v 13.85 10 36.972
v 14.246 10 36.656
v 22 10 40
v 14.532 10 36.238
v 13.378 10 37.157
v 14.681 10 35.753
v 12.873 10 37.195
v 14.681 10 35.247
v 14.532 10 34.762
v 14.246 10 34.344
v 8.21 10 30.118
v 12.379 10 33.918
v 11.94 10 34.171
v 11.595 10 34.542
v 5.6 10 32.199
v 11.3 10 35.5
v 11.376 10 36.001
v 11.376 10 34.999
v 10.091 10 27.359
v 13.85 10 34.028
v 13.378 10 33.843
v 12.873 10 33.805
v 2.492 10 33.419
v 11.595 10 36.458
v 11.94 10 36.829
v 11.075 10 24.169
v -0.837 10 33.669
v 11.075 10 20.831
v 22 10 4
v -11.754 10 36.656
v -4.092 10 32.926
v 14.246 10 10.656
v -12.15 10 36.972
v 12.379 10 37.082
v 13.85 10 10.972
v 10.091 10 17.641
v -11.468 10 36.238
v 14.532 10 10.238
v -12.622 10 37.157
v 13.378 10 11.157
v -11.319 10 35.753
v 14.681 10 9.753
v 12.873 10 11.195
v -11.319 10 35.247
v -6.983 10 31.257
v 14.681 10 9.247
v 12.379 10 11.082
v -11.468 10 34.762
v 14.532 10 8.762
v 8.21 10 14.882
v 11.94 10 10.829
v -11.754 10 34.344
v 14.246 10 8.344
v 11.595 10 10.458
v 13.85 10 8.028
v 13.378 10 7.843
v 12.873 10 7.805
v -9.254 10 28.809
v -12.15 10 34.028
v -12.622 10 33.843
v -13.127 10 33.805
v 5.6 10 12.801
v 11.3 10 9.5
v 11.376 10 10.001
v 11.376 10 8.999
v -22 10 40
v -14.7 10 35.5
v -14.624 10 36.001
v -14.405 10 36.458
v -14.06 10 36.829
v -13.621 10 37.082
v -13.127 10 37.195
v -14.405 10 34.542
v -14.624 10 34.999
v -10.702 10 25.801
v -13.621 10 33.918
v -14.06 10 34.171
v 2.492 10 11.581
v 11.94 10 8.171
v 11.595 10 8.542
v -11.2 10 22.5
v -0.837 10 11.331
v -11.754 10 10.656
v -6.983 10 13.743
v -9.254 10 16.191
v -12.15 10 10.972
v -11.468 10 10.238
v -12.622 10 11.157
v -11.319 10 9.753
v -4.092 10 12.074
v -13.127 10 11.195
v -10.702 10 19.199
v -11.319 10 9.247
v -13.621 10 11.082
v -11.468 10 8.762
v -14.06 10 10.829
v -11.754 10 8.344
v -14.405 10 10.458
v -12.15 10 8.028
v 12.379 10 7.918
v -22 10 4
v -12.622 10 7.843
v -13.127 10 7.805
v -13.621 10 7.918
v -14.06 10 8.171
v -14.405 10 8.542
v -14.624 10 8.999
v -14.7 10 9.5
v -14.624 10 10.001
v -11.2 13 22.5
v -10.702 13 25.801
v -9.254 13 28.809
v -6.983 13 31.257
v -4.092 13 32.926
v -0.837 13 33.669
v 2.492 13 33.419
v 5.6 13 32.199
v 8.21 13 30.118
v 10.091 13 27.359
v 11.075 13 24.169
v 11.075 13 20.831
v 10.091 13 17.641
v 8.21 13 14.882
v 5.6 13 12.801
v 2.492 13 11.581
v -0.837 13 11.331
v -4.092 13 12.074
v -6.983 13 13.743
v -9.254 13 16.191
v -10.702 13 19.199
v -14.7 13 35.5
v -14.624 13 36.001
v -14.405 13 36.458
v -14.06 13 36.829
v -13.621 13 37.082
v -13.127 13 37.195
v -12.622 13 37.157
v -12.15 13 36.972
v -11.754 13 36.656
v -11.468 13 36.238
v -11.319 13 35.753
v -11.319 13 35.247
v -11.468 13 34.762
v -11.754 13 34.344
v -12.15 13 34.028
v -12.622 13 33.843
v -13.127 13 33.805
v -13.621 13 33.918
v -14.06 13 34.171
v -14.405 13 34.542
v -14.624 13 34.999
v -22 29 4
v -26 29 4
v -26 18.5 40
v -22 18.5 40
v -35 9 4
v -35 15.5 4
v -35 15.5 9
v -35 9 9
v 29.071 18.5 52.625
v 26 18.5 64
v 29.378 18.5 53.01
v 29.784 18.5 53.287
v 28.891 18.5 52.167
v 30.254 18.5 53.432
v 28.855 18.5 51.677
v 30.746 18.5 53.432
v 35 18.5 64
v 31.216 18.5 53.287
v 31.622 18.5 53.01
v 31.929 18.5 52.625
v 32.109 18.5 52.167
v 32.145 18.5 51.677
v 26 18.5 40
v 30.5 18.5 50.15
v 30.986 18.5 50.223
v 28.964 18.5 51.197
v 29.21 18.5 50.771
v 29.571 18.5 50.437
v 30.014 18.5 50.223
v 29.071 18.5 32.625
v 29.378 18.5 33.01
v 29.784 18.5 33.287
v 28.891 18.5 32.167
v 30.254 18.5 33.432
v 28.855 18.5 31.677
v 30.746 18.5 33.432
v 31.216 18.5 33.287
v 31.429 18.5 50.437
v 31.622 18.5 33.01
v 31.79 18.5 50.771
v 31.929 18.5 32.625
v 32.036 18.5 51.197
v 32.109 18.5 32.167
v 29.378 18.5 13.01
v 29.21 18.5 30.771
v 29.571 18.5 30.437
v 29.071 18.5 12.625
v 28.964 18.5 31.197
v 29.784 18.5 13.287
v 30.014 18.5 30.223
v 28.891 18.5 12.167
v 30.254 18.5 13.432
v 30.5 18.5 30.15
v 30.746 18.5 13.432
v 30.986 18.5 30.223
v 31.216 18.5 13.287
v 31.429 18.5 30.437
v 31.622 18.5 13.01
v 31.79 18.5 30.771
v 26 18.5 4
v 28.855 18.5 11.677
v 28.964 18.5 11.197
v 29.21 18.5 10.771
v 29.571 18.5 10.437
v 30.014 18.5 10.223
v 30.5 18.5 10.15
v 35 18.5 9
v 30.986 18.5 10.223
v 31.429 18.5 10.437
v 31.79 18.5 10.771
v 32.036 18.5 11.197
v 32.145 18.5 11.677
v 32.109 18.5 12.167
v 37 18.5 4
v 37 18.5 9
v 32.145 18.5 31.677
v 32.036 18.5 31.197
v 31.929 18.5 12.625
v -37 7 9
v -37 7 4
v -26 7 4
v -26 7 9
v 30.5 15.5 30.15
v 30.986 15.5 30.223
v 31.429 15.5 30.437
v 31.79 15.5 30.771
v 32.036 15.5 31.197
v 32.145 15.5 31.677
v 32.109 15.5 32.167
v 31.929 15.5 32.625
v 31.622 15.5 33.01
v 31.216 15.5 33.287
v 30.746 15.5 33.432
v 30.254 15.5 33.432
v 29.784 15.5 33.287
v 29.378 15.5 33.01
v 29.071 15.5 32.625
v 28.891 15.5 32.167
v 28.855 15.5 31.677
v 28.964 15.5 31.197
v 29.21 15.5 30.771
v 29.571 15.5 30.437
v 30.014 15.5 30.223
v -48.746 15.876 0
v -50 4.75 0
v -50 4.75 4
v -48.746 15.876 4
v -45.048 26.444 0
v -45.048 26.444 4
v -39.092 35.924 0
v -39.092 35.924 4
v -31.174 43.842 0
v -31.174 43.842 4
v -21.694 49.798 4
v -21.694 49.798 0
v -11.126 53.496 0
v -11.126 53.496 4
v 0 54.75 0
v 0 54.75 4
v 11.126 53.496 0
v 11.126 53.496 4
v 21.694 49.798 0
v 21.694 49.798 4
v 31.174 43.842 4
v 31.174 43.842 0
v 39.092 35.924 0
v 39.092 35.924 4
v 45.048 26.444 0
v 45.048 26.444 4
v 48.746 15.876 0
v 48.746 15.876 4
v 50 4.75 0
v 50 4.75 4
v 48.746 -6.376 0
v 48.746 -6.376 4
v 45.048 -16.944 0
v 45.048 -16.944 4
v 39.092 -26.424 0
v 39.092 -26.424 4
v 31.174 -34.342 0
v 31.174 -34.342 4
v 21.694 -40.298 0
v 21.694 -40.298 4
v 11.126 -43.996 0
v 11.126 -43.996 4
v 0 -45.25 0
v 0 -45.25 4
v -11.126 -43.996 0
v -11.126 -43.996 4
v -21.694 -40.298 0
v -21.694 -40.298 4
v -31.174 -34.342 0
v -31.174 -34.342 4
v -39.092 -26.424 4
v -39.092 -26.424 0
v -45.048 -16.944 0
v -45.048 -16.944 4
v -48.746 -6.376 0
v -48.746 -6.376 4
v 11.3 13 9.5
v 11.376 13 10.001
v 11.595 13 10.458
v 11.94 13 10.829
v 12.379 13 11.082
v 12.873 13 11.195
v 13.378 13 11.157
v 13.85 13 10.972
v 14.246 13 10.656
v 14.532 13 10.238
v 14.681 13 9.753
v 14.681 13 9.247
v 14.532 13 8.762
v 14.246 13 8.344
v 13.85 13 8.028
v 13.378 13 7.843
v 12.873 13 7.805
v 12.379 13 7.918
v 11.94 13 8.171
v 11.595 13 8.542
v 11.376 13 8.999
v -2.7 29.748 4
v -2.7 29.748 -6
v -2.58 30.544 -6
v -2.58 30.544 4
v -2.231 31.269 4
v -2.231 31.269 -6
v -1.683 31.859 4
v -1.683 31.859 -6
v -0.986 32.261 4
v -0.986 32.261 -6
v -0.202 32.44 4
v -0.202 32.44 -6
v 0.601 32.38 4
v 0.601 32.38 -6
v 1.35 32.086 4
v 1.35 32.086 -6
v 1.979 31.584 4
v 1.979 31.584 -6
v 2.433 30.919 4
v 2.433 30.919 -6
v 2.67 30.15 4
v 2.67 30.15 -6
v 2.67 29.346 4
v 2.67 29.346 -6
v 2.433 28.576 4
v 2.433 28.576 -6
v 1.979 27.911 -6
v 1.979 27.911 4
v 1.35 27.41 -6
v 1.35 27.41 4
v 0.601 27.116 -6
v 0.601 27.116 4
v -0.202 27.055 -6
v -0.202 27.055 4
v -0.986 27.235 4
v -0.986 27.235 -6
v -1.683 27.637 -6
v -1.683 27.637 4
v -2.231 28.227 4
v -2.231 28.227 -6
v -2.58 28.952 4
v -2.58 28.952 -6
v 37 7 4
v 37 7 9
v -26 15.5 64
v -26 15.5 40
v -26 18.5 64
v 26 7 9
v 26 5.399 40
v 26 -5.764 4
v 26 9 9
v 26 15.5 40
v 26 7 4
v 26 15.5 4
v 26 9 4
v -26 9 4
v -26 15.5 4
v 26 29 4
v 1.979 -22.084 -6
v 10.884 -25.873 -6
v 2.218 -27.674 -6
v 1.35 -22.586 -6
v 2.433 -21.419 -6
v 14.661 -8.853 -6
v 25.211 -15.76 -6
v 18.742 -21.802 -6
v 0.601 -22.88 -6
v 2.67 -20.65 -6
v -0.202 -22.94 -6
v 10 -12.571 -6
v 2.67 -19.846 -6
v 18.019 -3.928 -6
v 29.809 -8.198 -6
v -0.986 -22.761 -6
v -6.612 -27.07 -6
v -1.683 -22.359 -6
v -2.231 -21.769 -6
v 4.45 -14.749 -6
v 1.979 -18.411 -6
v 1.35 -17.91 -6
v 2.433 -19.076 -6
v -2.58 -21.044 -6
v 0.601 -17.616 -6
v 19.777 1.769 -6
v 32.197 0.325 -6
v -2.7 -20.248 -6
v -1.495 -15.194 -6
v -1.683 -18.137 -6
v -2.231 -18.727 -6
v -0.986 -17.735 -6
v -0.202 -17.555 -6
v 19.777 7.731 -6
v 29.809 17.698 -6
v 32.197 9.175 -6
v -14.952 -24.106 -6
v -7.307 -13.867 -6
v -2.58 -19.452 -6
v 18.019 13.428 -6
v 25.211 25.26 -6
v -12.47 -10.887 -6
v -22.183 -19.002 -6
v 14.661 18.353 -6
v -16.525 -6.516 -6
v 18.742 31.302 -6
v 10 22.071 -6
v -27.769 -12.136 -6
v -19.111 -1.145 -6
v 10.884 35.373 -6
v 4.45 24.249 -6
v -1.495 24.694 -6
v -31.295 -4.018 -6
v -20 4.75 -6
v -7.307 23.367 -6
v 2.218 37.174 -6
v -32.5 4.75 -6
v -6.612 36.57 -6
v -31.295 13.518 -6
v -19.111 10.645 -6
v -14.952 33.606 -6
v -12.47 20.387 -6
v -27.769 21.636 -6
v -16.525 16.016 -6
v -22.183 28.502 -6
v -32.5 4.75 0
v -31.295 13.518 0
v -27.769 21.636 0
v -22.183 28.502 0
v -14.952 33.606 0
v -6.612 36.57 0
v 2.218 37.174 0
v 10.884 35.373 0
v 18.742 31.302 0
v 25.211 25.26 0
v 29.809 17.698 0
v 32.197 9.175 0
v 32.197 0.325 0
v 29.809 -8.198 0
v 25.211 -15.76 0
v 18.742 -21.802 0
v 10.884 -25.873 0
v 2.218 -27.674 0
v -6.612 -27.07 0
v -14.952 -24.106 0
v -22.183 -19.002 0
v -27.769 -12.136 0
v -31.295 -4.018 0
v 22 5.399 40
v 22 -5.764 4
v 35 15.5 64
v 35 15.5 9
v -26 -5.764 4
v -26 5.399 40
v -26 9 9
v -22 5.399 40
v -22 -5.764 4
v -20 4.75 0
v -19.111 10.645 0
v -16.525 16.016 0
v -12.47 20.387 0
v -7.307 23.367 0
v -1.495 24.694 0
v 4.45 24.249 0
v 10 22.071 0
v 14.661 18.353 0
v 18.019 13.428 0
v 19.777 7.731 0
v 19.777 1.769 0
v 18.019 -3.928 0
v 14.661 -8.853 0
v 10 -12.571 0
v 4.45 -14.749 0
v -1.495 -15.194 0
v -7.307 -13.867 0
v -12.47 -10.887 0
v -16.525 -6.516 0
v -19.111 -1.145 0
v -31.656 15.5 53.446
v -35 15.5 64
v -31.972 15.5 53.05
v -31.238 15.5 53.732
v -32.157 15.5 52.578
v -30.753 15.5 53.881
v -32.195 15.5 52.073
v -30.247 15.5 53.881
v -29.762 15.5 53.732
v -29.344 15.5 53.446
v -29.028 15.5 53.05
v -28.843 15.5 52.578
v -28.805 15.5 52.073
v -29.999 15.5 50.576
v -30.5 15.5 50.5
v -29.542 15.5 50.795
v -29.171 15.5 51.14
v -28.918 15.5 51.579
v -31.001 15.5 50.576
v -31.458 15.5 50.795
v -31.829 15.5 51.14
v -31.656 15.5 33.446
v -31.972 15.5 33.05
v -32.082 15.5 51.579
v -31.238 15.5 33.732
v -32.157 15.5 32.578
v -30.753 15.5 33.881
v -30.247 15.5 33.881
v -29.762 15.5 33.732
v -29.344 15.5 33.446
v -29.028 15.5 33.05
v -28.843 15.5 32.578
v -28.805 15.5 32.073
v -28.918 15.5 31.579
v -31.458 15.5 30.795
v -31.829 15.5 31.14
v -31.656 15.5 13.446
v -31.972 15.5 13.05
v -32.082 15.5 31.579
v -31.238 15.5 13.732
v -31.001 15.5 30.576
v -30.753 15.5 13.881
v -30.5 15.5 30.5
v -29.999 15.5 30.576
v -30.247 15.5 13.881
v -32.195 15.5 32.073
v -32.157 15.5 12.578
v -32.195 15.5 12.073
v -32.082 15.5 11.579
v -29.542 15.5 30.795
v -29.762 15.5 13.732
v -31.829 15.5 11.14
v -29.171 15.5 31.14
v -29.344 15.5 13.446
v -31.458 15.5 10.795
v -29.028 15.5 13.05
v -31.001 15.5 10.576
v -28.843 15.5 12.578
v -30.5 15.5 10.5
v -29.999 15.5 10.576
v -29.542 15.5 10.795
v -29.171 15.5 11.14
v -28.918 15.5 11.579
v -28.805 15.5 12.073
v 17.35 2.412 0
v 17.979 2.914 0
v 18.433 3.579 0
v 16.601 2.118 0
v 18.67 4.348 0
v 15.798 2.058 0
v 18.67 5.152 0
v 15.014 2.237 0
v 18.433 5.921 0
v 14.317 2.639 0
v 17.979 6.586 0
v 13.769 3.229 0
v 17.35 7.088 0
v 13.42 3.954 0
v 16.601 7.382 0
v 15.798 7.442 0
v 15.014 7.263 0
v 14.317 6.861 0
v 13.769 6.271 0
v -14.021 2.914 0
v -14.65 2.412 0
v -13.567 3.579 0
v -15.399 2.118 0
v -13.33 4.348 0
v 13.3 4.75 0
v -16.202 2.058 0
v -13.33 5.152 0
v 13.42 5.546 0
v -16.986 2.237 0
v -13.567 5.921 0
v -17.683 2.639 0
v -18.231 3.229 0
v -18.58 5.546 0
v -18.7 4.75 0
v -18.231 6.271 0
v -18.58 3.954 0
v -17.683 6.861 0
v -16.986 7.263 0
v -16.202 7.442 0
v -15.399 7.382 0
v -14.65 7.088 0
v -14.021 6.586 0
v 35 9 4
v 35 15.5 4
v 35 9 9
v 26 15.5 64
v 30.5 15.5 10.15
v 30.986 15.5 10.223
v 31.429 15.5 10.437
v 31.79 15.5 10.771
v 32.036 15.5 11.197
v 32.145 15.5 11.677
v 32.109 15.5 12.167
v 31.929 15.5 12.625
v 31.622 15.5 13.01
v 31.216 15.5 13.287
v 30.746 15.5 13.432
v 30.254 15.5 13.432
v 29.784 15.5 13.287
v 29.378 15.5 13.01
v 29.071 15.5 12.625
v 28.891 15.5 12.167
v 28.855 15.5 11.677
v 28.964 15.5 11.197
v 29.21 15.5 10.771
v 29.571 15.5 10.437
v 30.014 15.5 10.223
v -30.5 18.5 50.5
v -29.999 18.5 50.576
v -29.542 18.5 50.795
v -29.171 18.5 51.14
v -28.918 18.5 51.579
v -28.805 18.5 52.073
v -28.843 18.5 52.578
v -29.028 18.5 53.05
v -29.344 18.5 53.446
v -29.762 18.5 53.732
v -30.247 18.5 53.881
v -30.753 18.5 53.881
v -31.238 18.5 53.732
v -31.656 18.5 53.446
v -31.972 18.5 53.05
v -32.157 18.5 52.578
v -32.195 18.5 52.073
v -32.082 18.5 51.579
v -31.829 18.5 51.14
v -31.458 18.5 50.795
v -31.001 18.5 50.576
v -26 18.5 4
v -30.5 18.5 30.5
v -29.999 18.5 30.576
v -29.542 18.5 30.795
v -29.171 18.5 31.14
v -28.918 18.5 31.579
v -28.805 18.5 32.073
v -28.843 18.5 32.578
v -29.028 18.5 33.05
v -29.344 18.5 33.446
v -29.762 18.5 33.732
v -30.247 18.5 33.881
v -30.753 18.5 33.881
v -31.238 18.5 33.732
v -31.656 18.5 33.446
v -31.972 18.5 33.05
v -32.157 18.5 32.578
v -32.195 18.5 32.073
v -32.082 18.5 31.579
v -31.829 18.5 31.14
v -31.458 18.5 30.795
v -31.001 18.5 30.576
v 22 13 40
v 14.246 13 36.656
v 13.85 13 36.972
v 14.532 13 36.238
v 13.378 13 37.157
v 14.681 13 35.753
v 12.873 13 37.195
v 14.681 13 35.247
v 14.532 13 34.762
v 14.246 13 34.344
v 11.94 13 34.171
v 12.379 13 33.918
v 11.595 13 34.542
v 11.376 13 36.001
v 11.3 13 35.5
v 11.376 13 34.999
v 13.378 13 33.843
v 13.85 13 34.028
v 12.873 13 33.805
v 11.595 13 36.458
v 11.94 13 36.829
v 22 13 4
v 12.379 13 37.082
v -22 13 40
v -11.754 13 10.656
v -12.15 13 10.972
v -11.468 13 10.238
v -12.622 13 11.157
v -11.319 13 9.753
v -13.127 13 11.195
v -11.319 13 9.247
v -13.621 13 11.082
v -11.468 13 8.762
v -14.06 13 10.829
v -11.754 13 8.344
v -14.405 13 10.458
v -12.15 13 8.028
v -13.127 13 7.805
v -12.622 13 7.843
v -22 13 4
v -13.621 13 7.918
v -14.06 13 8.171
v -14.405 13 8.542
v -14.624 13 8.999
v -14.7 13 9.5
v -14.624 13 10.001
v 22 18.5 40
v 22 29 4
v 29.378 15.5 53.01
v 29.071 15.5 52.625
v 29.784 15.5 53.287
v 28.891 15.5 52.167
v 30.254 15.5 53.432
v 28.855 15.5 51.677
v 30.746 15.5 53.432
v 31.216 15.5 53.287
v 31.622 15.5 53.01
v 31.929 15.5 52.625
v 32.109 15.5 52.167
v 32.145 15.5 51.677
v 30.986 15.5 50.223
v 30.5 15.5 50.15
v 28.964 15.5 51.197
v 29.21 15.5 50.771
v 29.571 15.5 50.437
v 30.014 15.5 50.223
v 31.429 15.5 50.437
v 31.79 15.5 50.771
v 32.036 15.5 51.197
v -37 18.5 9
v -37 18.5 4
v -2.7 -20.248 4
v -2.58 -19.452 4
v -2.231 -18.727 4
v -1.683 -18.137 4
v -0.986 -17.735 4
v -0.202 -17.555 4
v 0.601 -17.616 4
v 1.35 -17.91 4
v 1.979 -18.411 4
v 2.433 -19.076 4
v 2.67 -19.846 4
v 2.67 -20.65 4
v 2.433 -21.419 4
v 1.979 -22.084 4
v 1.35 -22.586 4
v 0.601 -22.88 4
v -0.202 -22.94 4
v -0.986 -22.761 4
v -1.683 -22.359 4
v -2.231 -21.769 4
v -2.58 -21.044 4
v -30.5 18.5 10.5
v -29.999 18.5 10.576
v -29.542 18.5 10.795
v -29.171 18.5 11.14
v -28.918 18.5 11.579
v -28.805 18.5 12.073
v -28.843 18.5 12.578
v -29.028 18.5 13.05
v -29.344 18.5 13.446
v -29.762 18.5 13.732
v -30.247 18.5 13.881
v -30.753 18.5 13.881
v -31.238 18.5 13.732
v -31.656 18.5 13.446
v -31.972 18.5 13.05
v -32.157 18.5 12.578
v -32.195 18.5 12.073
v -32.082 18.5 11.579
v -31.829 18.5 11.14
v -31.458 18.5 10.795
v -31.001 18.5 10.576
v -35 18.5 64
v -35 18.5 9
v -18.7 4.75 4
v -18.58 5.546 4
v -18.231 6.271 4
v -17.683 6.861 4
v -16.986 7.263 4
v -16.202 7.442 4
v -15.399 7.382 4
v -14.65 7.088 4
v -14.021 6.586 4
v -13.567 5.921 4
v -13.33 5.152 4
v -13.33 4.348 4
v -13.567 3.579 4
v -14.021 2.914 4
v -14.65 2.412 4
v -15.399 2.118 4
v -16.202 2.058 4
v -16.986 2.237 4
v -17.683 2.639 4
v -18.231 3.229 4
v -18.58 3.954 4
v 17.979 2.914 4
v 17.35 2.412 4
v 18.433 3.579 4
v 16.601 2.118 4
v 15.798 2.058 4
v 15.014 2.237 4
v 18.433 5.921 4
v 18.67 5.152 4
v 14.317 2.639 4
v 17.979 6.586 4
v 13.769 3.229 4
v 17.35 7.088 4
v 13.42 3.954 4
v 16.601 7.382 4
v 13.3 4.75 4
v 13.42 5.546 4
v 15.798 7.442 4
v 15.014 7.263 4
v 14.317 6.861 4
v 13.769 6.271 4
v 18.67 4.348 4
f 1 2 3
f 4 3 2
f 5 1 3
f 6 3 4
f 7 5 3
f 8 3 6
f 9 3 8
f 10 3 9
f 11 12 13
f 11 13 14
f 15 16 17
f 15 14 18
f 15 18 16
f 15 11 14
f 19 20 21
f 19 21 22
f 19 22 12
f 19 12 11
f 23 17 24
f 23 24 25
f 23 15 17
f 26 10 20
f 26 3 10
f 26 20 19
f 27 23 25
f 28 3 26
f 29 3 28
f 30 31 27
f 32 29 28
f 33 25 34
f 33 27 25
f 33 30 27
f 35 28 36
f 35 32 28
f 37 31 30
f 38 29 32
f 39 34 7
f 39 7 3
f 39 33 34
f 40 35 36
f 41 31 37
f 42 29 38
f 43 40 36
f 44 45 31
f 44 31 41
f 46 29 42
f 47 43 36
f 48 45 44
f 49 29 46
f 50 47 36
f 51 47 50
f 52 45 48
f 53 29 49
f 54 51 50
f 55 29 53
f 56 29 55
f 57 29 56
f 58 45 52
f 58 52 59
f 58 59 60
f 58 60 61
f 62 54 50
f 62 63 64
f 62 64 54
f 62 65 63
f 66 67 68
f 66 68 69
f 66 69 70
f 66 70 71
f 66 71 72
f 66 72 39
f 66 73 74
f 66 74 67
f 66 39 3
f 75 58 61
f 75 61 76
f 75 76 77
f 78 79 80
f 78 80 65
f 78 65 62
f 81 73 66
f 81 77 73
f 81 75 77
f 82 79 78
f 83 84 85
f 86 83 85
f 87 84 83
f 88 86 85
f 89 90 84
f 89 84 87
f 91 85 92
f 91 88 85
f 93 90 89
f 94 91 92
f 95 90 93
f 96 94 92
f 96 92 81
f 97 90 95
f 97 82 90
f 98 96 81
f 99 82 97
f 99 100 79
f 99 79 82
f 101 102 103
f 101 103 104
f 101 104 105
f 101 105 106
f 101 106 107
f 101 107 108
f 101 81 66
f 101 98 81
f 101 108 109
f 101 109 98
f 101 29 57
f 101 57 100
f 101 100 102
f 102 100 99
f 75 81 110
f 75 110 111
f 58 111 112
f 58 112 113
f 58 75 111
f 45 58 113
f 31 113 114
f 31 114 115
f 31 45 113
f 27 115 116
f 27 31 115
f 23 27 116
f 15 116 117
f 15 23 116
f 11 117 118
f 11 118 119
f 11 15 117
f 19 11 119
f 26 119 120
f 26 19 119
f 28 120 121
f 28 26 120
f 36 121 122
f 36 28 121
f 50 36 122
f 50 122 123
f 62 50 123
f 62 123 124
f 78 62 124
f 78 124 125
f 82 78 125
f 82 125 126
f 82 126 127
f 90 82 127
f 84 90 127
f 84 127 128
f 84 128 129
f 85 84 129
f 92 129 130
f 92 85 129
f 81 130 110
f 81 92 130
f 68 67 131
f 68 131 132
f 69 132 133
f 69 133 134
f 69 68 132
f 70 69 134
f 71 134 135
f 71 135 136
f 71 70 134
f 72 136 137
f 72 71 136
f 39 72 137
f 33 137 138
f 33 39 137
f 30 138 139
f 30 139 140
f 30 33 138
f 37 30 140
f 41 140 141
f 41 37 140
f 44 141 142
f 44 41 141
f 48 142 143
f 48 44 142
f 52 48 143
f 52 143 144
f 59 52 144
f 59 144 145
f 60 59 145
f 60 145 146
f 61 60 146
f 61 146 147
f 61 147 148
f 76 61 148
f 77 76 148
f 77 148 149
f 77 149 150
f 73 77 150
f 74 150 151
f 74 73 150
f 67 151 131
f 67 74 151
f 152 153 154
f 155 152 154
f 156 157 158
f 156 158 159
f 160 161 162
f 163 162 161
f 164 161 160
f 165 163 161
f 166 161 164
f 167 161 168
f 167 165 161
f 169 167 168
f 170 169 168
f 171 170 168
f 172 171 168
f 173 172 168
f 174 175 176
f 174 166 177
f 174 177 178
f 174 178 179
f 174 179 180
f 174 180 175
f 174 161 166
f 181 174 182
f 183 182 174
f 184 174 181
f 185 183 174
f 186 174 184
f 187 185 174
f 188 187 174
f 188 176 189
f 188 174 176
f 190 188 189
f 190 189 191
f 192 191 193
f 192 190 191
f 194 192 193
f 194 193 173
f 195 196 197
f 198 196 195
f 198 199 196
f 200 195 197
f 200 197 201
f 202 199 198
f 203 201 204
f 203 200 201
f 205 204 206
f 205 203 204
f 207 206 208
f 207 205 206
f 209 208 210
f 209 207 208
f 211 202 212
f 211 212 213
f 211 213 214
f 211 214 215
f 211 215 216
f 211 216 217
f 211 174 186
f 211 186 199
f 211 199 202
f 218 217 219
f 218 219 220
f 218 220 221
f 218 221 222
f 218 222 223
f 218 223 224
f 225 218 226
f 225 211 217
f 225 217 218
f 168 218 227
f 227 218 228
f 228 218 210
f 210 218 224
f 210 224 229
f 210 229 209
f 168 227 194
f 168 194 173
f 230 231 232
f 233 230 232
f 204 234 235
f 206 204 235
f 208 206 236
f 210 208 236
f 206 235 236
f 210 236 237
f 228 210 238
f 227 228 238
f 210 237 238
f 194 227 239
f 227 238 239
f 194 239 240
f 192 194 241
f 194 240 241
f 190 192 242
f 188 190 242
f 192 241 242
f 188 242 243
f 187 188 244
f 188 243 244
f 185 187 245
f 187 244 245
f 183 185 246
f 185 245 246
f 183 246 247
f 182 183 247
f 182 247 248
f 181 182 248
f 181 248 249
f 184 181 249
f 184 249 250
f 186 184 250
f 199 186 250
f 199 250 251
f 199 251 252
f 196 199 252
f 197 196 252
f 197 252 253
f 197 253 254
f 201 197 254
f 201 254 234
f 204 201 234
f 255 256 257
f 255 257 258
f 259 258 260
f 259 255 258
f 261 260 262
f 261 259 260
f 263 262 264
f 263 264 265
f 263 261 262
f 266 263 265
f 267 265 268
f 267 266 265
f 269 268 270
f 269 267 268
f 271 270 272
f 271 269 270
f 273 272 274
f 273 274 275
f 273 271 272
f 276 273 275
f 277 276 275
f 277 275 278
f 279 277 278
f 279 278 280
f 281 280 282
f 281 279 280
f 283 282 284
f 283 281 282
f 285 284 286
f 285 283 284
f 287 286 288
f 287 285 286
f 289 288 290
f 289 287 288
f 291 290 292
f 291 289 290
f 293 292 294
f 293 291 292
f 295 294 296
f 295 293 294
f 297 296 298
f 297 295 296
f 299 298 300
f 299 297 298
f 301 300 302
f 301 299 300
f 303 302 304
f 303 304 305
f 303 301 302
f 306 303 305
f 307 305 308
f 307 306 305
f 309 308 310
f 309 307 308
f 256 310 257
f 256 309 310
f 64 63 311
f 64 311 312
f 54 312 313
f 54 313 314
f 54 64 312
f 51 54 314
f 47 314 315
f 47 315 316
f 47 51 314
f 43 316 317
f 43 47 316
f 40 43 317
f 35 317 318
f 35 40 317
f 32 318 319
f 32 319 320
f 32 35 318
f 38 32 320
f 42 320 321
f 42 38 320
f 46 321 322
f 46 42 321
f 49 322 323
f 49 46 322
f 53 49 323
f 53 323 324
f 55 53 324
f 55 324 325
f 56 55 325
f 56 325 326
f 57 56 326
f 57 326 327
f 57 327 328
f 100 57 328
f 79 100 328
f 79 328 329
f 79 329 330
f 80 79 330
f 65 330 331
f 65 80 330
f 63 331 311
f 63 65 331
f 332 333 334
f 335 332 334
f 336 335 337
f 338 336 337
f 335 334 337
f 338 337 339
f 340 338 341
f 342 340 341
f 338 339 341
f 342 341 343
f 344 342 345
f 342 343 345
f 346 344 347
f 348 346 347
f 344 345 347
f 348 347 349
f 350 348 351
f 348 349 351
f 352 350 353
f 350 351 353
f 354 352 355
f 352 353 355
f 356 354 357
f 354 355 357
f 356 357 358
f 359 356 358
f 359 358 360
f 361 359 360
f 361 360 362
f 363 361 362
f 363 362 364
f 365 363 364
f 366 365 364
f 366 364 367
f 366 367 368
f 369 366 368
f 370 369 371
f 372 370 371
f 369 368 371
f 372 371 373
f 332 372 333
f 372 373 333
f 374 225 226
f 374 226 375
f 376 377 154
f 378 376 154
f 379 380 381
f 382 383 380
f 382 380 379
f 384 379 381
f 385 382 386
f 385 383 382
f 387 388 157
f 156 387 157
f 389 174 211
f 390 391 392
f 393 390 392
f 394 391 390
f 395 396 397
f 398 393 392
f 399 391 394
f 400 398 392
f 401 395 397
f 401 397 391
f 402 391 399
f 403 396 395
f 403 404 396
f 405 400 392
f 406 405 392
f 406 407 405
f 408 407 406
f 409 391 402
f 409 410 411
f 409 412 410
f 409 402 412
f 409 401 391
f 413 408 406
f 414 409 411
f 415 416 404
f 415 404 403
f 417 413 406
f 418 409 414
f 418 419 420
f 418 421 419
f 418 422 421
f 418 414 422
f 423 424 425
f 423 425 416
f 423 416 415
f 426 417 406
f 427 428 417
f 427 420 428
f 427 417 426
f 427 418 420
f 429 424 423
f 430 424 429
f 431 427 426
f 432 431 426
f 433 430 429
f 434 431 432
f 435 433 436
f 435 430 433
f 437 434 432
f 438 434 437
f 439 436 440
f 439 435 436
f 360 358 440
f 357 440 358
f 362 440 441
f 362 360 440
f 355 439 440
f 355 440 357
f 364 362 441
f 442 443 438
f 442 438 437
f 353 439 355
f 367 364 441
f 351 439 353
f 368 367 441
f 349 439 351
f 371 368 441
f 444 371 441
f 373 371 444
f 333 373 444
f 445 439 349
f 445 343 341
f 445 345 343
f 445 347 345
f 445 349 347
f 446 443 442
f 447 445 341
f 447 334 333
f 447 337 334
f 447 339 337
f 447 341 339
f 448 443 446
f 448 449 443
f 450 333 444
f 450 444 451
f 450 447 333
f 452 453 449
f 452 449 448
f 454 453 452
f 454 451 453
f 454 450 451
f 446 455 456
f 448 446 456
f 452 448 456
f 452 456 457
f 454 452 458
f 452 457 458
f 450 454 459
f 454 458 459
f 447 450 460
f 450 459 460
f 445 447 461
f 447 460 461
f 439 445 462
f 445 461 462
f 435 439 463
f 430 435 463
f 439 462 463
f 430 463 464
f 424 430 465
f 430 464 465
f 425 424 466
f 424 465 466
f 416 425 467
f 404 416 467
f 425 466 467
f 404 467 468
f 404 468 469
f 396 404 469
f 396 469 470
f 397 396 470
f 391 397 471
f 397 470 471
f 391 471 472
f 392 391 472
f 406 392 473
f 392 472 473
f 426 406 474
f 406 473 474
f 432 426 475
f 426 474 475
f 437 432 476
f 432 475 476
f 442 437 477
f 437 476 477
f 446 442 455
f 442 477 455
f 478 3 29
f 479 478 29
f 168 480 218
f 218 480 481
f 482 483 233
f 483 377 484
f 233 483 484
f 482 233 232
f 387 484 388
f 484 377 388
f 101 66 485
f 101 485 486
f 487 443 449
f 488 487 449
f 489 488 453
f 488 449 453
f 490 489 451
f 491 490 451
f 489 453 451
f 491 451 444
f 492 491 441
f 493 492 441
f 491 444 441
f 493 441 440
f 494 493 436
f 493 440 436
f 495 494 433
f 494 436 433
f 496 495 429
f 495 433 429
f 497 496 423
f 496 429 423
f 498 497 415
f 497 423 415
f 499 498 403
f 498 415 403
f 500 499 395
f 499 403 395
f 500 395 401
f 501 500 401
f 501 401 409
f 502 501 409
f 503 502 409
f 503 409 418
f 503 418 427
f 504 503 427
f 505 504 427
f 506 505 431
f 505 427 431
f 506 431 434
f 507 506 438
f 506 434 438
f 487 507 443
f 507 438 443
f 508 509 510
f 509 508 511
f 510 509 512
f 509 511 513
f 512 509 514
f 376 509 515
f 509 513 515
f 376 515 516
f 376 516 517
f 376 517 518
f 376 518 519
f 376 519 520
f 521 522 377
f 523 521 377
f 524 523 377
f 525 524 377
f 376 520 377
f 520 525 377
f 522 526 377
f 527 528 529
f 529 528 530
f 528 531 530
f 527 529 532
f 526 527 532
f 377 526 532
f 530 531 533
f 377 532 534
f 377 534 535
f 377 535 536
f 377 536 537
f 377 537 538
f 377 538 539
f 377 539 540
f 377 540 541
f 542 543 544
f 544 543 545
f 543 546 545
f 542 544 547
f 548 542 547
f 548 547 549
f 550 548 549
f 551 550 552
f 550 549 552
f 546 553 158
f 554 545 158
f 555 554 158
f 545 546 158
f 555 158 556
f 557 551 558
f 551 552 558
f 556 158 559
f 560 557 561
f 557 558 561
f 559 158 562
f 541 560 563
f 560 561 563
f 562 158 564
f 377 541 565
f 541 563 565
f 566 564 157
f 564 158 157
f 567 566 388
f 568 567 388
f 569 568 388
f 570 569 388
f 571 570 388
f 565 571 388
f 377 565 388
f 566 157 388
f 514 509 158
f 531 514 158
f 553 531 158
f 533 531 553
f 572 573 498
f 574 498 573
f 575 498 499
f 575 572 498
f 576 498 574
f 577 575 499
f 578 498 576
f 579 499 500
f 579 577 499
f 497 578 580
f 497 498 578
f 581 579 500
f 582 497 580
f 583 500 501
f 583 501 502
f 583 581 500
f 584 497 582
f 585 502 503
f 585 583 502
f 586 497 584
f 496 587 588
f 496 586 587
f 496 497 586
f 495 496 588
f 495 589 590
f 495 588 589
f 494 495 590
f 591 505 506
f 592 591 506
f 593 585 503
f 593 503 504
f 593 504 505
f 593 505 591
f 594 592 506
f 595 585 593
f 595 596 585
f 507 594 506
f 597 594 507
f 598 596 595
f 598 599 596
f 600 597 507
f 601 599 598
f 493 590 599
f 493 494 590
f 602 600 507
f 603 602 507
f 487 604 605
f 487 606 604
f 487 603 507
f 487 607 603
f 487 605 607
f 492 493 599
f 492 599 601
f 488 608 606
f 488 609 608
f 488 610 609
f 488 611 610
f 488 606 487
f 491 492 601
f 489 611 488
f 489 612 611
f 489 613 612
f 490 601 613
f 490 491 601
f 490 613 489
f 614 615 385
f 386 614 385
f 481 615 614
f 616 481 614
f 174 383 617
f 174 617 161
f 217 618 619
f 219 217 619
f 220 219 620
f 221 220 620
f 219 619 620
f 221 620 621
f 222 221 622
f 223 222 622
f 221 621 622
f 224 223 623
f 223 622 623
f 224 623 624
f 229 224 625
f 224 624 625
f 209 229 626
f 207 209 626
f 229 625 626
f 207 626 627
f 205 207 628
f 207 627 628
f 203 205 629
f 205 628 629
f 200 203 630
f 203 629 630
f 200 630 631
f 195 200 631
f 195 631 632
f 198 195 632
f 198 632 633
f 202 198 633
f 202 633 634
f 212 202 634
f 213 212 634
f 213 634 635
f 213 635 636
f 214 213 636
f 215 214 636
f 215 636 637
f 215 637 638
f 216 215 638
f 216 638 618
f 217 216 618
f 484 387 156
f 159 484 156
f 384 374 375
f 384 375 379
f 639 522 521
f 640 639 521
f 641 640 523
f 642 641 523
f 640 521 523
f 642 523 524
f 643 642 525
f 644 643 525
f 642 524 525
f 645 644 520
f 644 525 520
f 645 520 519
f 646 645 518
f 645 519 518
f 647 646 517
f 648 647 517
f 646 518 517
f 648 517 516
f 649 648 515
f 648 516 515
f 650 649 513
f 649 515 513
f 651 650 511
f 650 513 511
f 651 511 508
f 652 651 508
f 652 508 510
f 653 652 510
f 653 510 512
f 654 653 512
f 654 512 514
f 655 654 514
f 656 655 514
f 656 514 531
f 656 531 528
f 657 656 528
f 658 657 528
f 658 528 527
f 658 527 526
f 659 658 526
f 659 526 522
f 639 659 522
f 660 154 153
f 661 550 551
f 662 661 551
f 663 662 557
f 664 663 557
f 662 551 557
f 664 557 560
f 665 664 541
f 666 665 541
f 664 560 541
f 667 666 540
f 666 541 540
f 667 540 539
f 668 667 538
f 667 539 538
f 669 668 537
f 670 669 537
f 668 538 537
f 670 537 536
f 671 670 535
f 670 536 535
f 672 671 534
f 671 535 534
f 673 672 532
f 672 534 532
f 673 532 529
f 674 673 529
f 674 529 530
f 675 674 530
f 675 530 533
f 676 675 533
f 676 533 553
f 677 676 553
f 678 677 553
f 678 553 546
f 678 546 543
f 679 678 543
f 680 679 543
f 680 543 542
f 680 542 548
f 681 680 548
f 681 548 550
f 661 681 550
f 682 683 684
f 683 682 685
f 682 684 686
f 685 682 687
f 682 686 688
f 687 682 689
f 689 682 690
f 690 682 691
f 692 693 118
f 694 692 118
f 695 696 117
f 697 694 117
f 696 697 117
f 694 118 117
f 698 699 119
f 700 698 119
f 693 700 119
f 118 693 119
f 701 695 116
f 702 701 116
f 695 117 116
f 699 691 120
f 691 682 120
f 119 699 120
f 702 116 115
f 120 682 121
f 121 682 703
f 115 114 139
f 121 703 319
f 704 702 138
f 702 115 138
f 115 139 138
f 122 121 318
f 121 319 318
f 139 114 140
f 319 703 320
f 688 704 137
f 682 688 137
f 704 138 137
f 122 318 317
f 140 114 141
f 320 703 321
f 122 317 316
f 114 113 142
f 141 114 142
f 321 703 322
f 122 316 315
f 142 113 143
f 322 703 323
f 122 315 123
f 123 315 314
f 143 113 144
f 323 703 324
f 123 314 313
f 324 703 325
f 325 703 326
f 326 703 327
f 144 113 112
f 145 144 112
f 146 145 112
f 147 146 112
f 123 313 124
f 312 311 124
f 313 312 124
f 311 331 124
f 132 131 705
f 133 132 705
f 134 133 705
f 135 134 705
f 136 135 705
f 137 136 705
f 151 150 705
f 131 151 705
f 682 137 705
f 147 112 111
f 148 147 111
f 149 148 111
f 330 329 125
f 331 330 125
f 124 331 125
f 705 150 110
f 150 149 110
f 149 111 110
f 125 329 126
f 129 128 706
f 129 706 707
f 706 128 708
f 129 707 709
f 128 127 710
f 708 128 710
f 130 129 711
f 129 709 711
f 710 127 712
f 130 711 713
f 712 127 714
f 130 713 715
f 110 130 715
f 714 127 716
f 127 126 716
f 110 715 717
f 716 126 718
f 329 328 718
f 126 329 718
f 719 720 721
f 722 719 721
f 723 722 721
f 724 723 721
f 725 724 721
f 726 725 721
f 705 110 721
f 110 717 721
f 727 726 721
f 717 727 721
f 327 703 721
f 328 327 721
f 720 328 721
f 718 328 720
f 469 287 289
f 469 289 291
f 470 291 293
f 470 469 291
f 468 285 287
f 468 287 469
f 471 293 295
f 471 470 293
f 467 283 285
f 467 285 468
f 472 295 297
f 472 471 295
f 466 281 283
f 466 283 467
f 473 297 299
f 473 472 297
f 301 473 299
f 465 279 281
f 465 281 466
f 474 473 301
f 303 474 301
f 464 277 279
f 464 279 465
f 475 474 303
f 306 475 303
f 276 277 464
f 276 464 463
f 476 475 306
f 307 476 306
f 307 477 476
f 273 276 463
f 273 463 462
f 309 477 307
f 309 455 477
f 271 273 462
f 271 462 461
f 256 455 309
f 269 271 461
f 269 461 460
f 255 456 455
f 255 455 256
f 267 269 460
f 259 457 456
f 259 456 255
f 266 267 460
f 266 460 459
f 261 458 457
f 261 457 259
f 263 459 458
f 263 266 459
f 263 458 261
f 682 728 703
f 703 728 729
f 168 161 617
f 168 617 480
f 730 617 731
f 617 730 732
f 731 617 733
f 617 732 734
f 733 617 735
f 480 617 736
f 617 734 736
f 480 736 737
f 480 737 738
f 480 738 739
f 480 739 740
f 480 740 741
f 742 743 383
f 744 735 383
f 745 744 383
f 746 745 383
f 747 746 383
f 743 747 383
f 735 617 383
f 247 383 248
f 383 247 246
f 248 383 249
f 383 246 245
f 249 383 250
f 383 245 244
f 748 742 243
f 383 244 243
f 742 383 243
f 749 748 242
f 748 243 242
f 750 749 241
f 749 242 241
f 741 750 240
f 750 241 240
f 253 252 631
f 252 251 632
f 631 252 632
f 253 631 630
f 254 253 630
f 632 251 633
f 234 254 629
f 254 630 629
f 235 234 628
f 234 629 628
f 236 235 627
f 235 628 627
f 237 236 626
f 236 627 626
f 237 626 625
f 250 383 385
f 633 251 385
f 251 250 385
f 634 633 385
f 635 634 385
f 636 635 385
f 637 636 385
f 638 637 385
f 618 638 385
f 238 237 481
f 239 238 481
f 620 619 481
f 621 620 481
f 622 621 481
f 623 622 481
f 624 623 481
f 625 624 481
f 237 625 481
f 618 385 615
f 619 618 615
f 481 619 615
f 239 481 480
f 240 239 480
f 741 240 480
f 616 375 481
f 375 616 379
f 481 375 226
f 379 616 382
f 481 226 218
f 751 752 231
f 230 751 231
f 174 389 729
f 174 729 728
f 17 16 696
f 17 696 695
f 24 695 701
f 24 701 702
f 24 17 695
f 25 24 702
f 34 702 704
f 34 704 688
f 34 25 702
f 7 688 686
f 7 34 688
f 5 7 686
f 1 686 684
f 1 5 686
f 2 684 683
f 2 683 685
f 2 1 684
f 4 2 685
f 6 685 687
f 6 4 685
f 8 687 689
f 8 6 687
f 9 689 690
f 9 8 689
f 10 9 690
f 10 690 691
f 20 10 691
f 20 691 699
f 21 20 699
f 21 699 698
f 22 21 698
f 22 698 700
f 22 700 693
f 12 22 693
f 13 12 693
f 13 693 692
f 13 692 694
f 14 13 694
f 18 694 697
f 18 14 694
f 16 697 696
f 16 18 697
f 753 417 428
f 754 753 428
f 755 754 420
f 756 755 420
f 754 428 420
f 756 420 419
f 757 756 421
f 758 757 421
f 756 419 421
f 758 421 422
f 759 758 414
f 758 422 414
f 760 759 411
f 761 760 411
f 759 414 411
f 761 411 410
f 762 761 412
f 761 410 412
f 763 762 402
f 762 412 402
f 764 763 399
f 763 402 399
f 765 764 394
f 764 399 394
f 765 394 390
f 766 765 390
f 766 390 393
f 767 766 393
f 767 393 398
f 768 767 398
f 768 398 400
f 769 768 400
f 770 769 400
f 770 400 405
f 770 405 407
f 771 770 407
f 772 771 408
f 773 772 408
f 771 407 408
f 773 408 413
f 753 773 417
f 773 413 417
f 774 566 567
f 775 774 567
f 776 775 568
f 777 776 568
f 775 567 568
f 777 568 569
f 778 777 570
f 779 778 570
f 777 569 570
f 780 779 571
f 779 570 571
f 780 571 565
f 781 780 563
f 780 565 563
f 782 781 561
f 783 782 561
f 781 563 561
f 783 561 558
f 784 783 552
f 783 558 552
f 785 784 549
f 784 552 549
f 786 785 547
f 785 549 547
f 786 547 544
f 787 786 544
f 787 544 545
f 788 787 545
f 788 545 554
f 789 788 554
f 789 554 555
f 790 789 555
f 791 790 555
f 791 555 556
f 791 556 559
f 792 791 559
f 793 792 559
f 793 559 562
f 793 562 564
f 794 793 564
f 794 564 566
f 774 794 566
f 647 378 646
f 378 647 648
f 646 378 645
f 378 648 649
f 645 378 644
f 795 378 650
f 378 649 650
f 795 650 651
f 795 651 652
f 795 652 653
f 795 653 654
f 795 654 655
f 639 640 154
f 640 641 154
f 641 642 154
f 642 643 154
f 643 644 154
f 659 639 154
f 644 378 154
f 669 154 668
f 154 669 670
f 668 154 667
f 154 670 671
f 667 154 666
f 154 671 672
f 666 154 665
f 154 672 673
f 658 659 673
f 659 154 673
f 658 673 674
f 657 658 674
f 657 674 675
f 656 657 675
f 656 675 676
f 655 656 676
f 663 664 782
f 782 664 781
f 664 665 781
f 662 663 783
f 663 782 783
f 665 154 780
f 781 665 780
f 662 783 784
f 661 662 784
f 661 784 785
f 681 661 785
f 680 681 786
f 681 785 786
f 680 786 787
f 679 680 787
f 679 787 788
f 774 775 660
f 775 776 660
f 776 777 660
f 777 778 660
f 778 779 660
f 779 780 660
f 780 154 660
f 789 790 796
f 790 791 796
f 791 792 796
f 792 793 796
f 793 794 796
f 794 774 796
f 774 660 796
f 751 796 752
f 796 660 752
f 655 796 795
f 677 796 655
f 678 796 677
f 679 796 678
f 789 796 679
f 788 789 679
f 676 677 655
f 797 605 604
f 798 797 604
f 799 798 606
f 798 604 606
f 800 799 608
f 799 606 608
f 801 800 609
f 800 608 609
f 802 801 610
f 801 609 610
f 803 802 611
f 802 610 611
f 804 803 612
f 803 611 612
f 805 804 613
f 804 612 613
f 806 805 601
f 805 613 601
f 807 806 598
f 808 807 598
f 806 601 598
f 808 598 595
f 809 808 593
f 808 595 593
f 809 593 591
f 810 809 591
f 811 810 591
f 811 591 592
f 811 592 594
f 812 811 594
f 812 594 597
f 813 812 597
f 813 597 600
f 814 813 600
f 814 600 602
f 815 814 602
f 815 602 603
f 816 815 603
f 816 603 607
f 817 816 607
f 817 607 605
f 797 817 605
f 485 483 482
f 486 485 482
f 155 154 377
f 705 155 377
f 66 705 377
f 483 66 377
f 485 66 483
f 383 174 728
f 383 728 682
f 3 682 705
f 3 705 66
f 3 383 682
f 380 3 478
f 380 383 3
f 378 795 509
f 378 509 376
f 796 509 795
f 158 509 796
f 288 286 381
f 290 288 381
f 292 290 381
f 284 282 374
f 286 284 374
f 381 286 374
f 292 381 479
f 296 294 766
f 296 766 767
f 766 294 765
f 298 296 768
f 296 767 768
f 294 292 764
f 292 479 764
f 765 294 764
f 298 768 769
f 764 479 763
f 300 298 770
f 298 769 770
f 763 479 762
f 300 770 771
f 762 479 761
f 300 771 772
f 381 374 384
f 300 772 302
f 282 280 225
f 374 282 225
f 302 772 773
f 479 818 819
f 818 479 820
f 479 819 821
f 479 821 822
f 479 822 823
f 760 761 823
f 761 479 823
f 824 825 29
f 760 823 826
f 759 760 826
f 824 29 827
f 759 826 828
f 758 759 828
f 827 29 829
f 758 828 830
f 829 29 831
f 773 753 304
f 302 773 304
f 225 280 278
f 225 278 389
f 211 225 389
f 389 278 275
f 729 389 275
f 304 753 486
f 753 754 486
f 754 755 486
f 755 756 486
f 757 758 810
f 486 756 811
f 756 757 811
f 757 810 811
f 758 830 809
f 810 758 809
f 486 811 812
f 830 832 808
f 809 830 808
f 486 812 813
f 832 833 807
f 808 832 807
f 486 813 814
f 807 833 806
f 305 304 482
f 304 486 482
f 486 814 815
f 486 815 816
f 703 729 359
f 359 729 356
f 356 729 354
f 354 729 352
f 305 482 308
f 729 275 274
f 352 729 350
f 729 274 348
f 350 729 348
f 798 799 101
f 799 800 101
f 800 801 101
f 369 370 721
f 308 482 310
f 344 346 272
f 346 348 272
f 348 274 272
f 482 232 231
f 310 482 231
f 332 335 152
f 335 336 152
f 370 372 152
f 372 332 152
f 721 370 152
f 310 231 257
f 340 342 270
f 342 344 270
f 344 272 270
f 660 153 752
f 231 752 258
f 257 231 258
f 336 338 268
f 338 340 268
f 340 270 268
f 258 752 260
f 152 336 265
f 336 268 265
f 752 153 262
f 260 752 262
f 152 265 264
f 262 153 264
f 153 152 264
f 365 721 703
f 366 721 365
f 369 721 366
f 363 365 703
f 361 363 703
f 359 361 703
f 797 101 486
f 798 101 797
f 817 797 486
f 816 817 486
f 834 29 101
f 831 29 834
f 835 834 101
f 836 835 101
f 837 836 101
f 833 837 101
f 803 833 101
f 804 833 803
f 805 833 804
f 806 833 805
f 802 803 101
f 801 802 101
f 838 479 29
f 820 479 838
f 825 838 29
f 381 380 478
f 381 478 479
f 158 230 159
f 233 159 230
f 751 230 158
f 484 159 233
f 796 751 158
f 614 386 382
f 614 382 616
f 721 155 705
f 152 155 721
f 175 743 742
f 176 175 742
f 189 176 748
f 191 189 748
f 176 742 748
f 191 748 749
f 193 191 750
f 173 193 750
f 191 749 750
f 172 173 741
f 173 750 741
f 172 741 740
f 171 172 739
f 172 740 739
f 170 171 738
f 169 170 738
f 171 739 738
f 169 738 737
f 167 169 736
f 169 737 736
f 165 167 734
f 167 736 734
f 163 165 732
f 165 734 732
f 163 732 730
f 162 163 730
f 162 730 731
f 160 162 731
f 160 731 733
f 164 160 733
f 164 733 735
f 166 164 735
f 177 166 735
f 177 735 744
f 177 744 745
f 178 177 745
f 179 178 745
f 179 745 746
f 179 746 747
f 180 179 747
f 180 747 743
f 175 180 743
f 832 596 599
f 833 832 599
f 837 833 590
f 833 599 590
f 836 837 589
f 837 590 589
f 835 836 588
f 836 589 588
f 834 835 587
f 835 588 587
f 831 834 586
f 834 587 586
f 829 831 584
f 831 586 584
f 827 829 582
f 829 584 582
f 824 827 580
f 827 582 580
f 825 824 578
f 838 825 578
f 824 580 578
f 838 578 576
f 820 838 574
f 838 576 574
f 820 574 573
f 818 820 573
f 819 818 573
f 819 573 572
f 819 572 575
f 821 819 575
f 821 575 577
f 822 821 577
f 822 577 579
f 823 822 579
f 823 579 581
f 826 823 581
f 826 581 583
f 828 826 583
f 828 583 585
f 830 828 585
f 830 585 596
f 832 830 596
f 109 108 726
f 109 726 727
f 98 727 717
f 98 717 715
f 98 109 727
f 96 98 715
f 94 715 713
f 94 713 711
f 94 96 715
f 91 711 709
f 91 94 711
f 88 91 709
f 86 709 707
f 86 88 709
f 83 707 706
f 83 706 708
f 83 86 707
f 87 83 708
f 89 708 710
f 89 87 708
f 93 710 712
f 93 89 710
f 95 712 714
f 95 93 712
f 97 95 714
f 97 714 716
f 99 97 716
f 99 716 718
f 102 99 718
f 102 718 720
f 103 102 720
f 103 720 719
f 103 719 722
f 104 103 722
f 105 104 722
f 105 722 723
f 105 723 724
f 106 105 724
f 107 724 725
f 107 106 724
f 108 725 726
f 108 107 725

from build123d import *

# Parameters (mm, degrees)
SKETCH_1_W          = 70
SKETCH_1_H          = 58
EXTRUDE_1_DEPTH     = 4
SKETCH_2_W          = 9
SKETCH_2_H          = 3
EXTRUDE_2_DEPTH     = 60
SKETCH_4_W          = 70
SKETCH_4_H          = 4
EXTRUDE_4_DEPTH     = 9.5
EXTRUDE_START       = -9
EXTRUDE_5_DEPTH     = 4
SKETCH_5_R          = 50
EXTRUDE_6_DEPTH     = 4
SKETCH_6_R          = 32.5
EXTRUDE_7_DEPTH     = 6
SKETCH_7_R          = 20
CUT_EXTRUDE_1_DEPTH = 6
SKETCH_8_R          = 2.7
CUT_EXTRUDE_2_DEPTH = 10
SKETCH_9_R          = 2.7
CUT_EXTRUDE_3_DEPTH = 10
SKETCH_11_R         = 11.2
SKETCH_11_R_2       = 1.7
EXTRUDE_8_DEPTH     = 3
SKETCH_13_R         = 1.65
SKETCH_13_R_2       = 1.7
CUT_EXTRUDE_4_DEPTH = 10
EXTRUDE_9_DEPTH     = 5


with BuildPart() as part:
    # 草图1 → 凸台-拉伸1 (new body)
    with BuildSketch(Plane.XY):
        Rectangle(SKETCH_1_W, SKETCH_1_H)
    extrude(amount=EXTRUDE_1_DEPTH)

    # 草图2 → 凸台-拉伸2 (add)
    with BuildSketch(Plane.XY.offset(4)):
        with Locations((-30.5, 17)):
            Rectangle(SKETCH_2_W, SKETCH_2_H)
        with Locations((30.5, 17)):
            Rectangle(SKETCH_2_W, SKETCH_2_H)
    extrude(amount=EXTRUDE_2_DEPTH)

    # 草图4 → 凸台-拉伸4 (add)
    with BuildSketch(Plane(origin=(0, 29, 0), x_dir=(1, 0, 0), z_dir=(0, 1, 0))):
        with Locations((0, -2)):
            Rectangle(SKETCH_4_W, SKETCH_4_H)
    extrude(amount=EXTRUDE_4_DEPTH)

    # 草图3 → 凸台-拉伸5 (add)
    with BuildSketch(Plane(origin=(35, 0, 0), x_dir=(0, 0, -1), z_dir=(1, 0, 0)).offset(EXTRUDE_START)):
        Polygon((-4, 29), (-40, 18.5), (-40, 15.5), (-40, 5.399002441), (-4, -5.764089994), (-4, -29), (0, -29), (0, 29), align=None)
    extrude_5 = extrude(amount=-EXTRUDE_5_DEPTH)

    # 镜向2: 凸台-拉伸5 across plane
    add(extrude_5.mirror(Plane(origin=(0, 0, 0), x_dir=(0, 0, 1), z_dir=(1, 0, 0))))

    # 草图5 → 凸台-拉伸6 (add)
    with BuildSketch(Plane(origin=(0, 0, 0), x_dir=(-1, 0, 0), z_dir=(0, 0, -1))):
        with Locations((0, 4.75)):
            Circle(SKETCH_5_R)
    extrude(amount=-EXTRUDE_6_DEPTH)

    # 草图6 → 凸台-拉伸7 (add)
    with BuildSketch(Plane(origin=(0, 0, 0), x_dir=(-1, 0, 0), z_dir=(0, 0, -1))):
        with Locations((0, 4.75)):
            Circle(SKETCH_6_R)
    extrude(amount=EXTRUDE_7_DEPTH)

    # 草图7 → 切除-拉伸1 (cut)
    with BuildSketch(Plane(origin=(0, 0, -6), x_dir=(-1, 0, 0), z_dir=(0, 0, -1))):
        with Locations((0, 4.75)):
            Circle(SKETCH_7_R)
    extrude(amount=-CUT_EXTRUDE_1_DEPTH, mode=Mode.SUBTRACT)

    # 草图8 → 切除-拉伸2 (cut)
    with BuildSketch(Plane(origin=(0, 0, -6), x_dir=(-1, 0, 0), z_dir=(0, 0, -1))):
        with Locations((0, -20.247950199)):
            Circle(SKETCH_8_R)
        with Locations((0, 29.747950199)):
            Circle(SKETCH_8_R)
    extrude(amount=-CUT_EXTRUDE_2_DEPTH, mode=Mode.SUBTRACT)

    # 草图9 → 切除-拉伸3 (cut)
    with BuildSketch(Plane(origin=(0, 0, 0), x_dir=(-1, 0, 0), z_dir=(0, 0, -1))):
        with Locations((-16, 4.75)):
            Circle(SKETCH_9_R)
        with Locations((16, 4.75)):
            Circle(SKETCH_9_R)
    extrude(amount=-CUT_EXTRUDE_3_DEPTH, mode=Mode.SUBTRACT)

    # 草图11 → 凸台-拉伸8 (add)
    with BuildSketch(Plane(origin=(0, 10, 0), x_dir=(1, 0, 0), z_dir=(0, 1, 0))):
        Polygon((-17.5, -4), (17.5, -4), (22, -4), (22, -40), (17.5, -40), (-17.5, -40), (-22, -40), (-22, -4), align=None)
        with Locations(Location((0, -22.5, 0), (0, 0, 180))):
            Circle(SKETCH_11_R, mode=Mode.SUBTRACT)
        with Locations(Location((-13, -9.5, 0), (0, 0, 180))):
            Circle(SKETCH_11_R_2, mode=Mode.SUBTRACT)
        with Locations(Location((13, -9.5, 0), (0, 0, 180))):
            Circle(SKETCH_11_R_2, mode=Mode.SUBTRACT)
        with Locations(Location((13, -35.5, 0), (0, 0, 180))):
            Circle(SKETCH_11_R_2, mode=Mode.SUBTRACT)
        with Locations(Location((-13, -35.5, 0), (0, 0, 180))):
            Circle(SKETCH_11_R_2, mode=Mode.SUBTRACT)
    extrude(amount=EXTRUDE_8_DEPTH)

    # 草图13 → 切除-拉伸4 (cut)
    with BuildSketch(Plane.XZ.offset(-15.5)):
        with Locations(Location((30.5, 11.8, 0), (0, 0, 270))):
            Circle(SKETCH_13_R)
        with Locations(Location((30.5, 31.8, 0), (0, 0, 270))):
            Circle(SKETCH_13_R)
        with Locations(Location((30.5, 51.8, 0), (0, 0, 270))):
            Circle(SKETCH_13_R)
        with Locations(Location((-30.5, 12.2, 0), (0, 0, 270))):
            Circle(SKETCH_13_R_2)
        with Locations(Location((-30.5, 32.2, 0), (0, 0, 270))):
            Circle(SKETCH_13_R_2)
        with Locations(Location((-30.5, 52.2, 0), (0, 0, 270))):
            Circle(SKETCH_13_R_2)
    extrude(amount=-CUT_EXTRUDE_4_DEPTH, mode=Mode.SUBTRACT)

    # 草图14 → 凸台-拉伸9 (add)
    with BuildSketch(Plane.XY.offset(4)):
        Polygon((26, 9), (35, 9), (35, 15.5), (35, 18.5), (37, 18.5), (37, 7), (26, 7), align=None)
    extrude_9 = extrude(amount=EXTRUDE_9_DEPTH)

    # 镜向3: 凸台-拉伸9 across plane
    add(extrude_9.mirror(Plane(origin=(0, 0, 0), x_dir=(0, 0, 1), z_dir=(1, 0, 0))))


solid = part.part
